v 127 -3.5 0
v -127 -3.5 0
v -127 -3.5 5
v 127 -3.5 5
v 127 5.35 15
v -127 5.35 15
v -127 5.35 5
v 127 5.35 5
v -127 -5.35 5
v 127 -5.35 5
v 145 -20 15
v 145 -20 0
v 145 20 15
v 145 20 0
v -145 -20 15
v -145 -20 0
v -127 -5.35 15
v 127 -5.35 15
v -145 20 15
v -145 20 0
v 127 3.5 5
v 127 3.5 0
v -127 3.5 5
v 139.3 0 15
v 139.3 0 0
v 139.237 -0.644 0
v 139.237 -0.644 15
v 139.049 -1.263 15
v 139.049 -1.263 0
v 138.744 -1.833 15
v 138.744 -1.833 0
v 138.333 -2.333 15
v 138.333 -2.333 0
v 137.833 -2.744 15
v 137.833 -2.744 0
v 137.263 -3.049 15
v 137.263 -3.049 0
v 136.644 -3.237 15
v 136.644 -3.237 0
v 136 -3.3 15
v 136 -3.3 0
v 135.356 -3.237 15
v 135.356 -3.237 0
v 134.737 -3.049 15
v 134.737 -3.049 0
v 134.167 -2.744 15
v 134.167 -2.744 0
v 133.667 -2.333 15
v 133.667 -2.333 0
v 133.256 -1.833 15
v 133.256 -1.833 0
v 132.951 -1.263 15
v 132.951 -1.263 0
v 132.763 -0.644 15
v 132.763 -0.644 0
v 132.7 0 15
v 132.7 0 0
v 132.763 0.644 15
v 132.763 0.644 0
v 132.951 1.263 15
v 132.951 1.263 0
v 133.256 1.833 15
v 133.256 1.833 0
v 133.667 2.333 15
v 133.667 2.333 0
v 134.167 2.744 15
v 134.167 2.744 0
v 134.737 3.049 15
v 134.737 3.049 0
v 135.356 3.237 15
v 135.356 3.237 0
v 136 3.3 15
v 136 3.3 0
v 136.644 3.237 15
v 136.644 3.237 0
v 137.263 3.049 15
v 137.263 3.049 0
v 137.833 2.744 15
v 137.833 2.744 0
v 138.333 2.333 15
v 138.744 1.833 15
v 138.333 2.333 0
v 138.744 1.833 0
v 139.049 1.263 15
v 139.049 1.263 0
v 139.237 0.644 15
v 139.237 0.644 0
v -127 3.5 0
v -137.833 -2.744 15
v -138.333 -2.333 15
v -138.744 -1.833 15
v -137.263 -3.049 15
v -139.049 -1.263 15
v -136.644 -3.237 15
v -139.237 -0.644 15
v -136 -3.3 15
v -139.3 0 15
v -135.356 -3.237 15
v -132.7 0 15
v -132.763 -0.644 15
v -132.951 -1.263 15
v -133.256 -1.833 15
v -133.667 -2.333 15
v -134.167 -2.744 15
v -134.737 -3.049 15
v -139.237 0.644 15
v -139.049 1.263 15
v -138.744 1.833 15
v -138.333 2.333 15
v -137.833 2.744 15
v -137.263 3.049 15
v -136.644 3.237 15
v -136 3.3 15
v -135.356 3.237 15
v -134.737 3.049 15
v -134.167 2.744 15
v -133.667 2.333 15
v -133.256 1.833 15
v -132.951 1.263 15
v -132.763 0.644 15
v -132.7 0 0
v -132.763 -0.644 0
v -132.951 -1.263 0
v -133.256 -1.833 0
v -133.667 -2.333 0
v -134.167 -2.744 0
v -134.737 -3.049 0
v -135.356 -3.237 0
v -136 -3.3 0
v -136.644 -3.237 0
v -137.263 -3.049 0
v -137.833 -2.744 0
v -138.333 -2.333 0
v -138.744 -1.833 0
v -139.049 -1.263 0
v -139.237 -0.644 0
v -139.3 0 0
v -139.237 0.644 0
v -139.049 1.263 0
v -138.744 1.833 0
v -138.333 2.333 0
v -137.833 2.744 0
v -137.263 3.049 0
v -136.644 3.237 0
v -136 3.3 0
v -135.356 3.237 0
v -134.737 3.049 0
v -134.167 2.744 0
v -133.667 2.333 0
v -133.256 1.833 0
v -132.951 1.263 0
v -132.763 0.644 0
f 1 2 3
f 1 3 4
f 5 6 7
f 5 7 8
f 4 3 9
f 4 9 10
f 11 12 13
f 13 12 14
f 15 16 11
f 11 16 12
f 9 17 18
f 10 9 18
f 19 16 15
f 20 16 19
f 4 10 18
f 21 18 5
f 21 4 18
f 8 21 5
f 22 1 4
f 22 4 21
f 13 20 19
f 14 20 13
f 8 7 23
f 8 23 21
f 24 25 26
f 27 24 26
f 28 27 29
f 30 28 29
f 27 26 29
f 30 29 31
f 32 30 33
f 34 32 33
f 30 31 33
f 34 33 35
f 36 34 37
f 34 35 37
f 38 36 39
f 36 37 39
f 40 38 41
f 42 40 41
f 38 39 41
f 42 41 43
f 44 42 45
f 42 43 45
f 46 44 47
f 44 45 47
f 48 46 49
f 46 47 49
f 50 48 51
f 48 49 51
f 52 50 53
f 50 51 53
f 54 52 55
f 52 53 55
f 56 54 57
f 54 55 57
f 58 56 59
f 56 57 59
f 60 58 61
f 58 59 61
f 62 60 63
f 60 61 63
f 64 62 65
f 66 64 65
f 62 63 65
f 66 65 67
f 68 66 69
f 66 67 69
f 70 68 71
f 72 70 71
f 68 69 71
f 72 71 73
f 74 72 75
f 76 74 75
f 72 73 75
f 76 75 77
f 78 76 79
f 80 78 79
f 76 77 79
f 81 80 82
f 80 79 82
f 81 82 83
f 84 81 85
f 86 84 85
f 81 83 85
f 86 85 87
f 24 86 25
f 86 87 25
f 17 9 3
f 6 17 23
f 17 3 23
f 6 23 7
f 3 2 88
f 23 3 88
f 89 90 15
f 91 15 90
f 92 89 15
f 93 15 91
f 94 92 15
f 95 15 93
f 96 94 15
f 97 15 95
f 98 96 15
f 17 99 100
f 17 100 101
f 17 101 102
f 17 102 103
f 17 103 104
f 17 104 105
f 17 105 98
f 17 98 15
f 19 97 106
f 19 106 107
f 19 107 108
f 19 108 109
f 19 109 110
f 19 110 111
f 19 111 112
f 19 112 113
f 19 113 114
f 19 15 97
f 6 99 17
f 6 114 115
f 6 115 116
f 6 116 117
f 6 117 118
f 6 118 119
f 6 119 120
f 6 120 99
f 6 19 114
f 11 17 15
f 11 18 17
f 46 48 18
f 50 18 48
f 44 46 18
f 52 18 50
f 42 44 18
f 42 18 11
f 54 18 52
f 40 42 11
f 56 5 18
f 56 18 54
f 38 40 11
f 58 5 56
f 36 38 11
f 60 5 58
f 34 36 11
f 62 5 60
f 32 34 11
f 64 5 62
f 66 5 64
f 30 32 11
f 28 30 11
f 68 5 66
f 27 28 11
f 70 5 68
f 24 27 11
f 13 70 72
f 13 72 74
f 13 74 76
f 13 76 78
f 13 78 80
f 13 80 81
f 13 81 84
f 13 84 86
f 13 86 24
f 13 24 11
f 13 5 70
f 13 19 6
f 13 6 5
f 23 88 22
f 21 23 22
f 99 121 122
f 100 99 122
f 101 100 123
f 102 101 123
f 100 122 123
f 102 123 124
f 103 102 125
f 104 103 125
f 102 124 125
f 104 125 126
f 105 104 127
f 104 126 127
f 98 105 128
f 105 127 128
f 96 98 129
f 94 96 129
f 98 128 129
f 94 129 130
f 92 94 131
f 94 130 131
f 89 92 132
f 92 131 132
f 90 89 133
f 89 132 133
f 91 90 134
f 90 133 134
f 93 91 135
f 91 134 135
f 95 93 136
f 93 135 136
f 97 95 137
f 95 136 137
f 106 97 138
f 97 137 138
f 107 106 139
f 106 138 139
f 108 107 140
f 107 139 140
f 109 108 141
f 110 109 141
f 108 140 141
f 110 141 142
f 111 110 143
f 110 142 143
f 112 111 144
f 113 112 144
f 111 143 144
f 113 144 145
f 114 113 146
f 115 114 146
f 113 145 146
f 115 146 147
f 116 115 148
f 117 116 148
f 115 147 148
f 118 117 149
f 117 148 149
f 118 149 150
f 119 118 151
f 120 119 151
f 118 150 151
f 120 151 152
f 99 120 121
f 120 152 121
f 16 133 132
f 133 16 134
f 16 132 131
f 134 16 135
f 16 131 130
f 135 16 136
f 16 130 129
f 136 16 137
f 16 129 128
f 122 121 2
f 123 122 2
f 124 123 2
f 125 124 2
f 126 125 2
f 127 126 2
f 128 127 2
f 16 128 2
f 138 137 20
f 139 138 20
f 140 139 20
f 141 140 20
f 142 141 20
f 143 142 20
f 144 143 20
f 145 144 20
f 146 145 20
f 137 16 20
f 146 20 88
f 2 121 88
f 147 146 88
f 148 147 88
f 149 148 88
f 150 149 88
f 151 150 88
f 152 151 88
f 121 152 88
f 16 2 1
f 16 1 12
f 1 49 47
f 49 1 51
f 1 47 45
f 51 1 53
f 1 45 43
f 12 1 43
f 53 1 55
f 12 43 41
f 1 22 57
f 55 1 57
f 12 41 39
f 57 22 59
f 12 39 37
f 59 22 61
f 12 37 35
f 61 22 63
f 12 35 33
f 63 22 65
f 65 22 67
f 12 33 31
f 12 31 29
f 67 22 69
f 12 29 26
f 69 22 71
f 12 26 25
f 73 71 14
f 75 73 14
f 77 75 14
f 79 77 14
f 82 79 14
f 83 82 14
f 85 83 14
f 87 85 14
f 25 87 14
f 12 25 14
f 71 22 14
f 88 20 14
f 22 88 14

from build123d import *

# Parameters (mm, degrees)
F0_W     = 290
F0_H     = 40
F0_W_2   = 254
F0_H_2   = 7
F1_DEPTH = 15
F2_W     = 254
F2_H     = 10.7
F3_DEPTH = 10
F4_R     = 3.3
F5_DEPTH = 15


with BuildPart() as f1:
    # F0 (on Top) → F1 (new body)
    with BuildSketch(Plane.XY):
        Rectangle(F0_W, F0_H)
        Rectangle(F0_W_2, F0_H_2, mode=Mode.SUBTRACT)
    extrude(amount=F1_DEPTH)

    # F2 (on face) → F3 (cut)
    with BuildSketch(Plane.XY.offset(15)):
        Rectangle(F2_W, F2_H)
    extrude(amount=-F3_DEPTH, mode=Mode.SUBTRACT)

    # F4 (on face) → F5 (cut, through all)
    with BuildSketch(Plane(origin=(0, 0, 0), x_dir=(1, 0, 0), z_dir=(0, 0, -1))):
        with Locations((-136, 0)):
            Circle(F4_R)
        with Locations((136, 0)):
            Circle(F4_R)
    extrude(amount=-F5_DEPTH, mode=Mode.SUBTRACT)


solid = f1.part
